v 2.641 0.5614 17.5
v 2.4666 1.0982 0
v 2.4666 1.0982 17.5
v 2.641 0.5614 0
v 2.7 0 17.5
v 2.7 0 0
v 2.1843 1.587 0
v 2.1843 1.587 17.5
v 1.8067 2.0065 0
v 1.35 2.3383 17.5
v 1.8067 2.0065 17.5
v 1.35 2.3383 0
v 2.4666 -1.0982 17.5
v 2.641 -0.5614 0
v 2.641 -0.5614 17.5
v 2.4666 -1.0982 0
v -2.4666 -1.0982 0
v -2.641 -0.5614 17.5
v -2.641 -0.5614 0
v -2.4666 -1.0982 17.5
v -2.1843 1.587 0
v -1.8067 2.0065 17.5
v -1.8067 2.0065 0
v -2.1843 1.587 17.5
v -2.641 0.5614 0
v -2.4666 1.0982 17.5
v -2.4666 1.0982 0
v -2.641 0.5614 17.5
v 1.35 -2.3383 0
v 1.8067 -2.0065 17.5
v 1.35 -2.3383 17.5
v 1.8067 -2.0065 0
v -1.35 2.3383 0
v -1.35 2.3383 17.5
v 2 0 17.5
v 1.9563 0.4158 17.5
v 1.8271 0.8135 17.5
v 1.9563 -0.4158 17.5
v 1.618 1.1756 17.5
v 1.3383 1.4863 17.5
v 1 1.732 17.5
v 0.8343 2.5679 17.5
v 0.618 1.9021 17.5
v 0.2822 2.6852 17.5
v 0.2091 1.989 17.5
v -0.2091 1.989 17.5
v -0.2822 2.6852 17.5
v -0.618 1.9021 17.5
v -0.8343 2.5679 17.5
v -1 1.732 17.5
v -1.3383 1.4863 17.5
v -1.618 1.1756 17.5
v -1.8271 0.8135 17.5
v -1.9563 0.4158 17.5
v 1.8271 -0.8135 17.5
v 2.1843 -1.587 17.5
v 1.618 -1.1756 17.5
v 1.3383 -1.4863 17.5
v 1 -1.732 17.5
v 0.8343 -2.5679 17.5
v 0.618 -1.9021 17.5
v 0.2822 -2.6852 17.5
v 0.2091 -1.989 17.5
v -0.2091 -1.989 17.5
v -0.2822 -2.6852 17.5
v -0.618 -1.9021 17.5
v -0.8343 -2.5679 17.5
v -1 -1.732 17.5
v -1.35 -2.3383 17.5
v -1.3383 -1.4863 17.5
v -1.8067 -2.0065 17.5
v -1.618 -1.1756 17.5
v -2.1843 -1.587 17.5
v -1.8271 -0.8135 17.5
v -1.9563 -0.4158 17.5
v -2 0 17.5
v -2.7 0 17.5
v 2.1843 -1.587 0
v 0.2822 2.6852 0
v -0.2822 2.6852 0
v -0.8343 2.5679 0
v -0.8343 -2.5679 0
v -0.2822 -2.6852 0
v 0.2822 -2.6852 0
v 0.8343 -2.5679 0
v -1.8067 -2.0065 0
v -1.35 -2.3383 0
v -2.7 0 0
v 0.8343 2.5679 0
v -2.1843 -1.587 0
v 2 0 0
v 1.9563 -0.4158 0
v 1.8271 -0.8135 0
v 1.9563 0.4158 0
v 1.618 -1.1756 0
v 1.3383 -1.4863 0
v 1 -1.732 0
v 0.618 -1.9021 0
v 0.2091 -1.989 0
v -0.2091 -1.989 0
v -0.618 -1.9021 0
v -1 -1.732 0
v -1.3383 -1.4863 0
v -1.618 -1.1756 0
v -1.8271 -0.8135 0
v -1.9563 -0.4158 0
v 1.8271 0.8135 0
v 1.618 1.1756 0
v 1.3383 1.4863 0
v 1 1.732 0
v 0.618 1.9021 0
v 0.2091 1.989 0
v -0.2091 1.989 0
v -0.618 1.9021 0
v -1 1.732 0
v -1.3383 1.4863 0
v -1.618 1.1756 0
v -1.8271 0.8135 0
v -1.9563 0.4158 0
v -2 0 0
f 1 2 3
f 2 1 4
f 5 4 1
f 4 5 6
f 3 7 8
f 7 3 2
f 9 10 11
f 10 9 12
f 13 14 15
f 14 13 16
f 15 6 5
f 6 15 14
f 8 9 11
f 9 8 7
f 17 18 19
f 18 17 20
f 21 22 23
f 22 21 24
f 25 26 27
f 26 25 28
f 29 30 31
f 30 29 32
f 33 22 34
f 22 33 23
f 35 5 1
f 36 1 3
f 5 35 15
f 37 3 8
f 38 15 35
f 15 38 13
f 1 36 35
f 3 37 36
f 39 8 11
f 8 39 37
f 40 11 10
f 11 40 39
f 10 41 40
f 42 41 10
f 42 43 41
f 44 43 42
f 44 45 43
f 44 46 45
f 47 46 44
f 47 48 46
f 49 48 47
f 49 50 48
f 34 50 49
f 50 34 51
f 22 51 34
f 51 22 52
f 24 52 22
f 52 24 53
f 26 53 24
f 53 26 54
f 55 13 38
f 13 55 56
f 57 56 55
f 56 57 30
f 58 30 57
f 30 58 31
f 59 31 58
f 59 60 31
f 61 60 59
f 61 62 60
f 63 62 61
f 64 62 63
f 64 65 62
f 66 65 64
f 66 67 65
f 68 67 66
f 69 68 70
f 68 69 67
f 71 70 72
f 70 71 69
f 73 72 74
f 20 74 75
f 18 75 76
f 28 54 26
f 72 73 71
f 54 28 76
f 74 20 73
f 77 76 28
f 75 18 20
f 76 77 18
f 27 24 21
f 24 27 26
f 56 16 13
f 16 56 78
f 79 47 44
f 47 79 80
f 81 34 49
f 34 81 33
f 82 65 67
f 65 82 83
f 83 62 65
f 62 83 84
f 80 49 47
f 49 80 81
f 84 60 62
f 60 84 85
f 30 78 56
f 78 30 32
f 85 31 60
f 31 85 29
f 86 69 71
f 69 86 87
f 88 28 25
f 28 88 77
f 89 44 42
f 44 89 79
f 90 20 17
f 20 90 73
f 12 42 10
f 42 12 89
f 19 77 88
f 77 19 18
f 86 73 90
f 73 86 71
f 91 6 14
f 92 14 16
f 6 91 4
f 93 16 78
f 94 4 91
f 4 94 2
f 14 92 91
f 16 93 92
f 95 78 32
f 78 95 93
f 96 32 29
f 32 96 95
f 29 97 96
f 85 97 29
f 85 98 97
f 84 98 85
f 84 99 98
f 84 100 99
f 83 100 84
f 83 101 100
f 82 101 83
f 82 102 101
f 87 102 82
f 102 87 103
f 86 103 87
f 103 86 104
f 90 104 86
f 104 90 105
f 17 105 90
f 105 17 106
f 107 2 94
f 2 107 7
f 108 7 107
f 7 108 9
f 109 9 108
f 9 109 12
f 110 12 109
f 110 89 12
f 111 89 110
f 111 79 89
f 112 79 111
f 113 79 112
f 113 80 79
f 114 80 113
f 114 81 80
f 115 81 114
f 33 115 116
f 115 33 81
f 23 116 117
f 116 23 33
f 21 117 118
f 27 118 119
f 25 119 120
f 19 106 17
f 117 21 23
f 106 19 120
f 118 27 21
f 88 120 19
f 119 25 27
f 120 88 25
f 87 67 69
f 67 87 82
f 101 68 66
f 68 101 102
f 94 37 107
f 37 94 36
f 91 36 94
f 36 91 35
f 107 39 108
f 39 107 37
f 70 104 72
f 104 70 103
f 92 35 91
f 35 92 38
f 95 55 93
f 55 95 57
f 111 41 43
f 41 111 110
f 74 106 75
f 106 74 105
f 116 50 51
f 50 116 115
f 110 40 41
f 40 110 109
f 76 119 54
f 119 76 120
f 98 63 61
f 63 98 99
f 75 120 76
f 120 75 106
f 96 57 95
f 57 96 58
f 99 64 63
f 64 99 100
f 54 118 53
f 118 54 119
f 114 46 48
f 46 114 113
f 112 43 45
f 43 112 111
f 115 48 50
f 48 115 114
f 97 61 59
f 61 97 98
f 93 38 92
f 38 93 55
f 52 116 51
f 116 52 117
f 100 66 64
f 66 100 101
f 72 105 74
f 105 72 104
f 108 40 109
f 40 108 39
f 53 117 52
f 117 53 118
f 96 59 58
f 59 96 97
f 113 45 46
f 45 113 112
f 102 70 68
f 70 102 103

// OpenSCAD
difference(){
  cylinder(h=(37.5 - 20), d=4 + 1.4, $fn=30);
  translate([0, 0, -1])cylinder(h=37.5 + 2 - 20, d=4, $fn=30);
}
